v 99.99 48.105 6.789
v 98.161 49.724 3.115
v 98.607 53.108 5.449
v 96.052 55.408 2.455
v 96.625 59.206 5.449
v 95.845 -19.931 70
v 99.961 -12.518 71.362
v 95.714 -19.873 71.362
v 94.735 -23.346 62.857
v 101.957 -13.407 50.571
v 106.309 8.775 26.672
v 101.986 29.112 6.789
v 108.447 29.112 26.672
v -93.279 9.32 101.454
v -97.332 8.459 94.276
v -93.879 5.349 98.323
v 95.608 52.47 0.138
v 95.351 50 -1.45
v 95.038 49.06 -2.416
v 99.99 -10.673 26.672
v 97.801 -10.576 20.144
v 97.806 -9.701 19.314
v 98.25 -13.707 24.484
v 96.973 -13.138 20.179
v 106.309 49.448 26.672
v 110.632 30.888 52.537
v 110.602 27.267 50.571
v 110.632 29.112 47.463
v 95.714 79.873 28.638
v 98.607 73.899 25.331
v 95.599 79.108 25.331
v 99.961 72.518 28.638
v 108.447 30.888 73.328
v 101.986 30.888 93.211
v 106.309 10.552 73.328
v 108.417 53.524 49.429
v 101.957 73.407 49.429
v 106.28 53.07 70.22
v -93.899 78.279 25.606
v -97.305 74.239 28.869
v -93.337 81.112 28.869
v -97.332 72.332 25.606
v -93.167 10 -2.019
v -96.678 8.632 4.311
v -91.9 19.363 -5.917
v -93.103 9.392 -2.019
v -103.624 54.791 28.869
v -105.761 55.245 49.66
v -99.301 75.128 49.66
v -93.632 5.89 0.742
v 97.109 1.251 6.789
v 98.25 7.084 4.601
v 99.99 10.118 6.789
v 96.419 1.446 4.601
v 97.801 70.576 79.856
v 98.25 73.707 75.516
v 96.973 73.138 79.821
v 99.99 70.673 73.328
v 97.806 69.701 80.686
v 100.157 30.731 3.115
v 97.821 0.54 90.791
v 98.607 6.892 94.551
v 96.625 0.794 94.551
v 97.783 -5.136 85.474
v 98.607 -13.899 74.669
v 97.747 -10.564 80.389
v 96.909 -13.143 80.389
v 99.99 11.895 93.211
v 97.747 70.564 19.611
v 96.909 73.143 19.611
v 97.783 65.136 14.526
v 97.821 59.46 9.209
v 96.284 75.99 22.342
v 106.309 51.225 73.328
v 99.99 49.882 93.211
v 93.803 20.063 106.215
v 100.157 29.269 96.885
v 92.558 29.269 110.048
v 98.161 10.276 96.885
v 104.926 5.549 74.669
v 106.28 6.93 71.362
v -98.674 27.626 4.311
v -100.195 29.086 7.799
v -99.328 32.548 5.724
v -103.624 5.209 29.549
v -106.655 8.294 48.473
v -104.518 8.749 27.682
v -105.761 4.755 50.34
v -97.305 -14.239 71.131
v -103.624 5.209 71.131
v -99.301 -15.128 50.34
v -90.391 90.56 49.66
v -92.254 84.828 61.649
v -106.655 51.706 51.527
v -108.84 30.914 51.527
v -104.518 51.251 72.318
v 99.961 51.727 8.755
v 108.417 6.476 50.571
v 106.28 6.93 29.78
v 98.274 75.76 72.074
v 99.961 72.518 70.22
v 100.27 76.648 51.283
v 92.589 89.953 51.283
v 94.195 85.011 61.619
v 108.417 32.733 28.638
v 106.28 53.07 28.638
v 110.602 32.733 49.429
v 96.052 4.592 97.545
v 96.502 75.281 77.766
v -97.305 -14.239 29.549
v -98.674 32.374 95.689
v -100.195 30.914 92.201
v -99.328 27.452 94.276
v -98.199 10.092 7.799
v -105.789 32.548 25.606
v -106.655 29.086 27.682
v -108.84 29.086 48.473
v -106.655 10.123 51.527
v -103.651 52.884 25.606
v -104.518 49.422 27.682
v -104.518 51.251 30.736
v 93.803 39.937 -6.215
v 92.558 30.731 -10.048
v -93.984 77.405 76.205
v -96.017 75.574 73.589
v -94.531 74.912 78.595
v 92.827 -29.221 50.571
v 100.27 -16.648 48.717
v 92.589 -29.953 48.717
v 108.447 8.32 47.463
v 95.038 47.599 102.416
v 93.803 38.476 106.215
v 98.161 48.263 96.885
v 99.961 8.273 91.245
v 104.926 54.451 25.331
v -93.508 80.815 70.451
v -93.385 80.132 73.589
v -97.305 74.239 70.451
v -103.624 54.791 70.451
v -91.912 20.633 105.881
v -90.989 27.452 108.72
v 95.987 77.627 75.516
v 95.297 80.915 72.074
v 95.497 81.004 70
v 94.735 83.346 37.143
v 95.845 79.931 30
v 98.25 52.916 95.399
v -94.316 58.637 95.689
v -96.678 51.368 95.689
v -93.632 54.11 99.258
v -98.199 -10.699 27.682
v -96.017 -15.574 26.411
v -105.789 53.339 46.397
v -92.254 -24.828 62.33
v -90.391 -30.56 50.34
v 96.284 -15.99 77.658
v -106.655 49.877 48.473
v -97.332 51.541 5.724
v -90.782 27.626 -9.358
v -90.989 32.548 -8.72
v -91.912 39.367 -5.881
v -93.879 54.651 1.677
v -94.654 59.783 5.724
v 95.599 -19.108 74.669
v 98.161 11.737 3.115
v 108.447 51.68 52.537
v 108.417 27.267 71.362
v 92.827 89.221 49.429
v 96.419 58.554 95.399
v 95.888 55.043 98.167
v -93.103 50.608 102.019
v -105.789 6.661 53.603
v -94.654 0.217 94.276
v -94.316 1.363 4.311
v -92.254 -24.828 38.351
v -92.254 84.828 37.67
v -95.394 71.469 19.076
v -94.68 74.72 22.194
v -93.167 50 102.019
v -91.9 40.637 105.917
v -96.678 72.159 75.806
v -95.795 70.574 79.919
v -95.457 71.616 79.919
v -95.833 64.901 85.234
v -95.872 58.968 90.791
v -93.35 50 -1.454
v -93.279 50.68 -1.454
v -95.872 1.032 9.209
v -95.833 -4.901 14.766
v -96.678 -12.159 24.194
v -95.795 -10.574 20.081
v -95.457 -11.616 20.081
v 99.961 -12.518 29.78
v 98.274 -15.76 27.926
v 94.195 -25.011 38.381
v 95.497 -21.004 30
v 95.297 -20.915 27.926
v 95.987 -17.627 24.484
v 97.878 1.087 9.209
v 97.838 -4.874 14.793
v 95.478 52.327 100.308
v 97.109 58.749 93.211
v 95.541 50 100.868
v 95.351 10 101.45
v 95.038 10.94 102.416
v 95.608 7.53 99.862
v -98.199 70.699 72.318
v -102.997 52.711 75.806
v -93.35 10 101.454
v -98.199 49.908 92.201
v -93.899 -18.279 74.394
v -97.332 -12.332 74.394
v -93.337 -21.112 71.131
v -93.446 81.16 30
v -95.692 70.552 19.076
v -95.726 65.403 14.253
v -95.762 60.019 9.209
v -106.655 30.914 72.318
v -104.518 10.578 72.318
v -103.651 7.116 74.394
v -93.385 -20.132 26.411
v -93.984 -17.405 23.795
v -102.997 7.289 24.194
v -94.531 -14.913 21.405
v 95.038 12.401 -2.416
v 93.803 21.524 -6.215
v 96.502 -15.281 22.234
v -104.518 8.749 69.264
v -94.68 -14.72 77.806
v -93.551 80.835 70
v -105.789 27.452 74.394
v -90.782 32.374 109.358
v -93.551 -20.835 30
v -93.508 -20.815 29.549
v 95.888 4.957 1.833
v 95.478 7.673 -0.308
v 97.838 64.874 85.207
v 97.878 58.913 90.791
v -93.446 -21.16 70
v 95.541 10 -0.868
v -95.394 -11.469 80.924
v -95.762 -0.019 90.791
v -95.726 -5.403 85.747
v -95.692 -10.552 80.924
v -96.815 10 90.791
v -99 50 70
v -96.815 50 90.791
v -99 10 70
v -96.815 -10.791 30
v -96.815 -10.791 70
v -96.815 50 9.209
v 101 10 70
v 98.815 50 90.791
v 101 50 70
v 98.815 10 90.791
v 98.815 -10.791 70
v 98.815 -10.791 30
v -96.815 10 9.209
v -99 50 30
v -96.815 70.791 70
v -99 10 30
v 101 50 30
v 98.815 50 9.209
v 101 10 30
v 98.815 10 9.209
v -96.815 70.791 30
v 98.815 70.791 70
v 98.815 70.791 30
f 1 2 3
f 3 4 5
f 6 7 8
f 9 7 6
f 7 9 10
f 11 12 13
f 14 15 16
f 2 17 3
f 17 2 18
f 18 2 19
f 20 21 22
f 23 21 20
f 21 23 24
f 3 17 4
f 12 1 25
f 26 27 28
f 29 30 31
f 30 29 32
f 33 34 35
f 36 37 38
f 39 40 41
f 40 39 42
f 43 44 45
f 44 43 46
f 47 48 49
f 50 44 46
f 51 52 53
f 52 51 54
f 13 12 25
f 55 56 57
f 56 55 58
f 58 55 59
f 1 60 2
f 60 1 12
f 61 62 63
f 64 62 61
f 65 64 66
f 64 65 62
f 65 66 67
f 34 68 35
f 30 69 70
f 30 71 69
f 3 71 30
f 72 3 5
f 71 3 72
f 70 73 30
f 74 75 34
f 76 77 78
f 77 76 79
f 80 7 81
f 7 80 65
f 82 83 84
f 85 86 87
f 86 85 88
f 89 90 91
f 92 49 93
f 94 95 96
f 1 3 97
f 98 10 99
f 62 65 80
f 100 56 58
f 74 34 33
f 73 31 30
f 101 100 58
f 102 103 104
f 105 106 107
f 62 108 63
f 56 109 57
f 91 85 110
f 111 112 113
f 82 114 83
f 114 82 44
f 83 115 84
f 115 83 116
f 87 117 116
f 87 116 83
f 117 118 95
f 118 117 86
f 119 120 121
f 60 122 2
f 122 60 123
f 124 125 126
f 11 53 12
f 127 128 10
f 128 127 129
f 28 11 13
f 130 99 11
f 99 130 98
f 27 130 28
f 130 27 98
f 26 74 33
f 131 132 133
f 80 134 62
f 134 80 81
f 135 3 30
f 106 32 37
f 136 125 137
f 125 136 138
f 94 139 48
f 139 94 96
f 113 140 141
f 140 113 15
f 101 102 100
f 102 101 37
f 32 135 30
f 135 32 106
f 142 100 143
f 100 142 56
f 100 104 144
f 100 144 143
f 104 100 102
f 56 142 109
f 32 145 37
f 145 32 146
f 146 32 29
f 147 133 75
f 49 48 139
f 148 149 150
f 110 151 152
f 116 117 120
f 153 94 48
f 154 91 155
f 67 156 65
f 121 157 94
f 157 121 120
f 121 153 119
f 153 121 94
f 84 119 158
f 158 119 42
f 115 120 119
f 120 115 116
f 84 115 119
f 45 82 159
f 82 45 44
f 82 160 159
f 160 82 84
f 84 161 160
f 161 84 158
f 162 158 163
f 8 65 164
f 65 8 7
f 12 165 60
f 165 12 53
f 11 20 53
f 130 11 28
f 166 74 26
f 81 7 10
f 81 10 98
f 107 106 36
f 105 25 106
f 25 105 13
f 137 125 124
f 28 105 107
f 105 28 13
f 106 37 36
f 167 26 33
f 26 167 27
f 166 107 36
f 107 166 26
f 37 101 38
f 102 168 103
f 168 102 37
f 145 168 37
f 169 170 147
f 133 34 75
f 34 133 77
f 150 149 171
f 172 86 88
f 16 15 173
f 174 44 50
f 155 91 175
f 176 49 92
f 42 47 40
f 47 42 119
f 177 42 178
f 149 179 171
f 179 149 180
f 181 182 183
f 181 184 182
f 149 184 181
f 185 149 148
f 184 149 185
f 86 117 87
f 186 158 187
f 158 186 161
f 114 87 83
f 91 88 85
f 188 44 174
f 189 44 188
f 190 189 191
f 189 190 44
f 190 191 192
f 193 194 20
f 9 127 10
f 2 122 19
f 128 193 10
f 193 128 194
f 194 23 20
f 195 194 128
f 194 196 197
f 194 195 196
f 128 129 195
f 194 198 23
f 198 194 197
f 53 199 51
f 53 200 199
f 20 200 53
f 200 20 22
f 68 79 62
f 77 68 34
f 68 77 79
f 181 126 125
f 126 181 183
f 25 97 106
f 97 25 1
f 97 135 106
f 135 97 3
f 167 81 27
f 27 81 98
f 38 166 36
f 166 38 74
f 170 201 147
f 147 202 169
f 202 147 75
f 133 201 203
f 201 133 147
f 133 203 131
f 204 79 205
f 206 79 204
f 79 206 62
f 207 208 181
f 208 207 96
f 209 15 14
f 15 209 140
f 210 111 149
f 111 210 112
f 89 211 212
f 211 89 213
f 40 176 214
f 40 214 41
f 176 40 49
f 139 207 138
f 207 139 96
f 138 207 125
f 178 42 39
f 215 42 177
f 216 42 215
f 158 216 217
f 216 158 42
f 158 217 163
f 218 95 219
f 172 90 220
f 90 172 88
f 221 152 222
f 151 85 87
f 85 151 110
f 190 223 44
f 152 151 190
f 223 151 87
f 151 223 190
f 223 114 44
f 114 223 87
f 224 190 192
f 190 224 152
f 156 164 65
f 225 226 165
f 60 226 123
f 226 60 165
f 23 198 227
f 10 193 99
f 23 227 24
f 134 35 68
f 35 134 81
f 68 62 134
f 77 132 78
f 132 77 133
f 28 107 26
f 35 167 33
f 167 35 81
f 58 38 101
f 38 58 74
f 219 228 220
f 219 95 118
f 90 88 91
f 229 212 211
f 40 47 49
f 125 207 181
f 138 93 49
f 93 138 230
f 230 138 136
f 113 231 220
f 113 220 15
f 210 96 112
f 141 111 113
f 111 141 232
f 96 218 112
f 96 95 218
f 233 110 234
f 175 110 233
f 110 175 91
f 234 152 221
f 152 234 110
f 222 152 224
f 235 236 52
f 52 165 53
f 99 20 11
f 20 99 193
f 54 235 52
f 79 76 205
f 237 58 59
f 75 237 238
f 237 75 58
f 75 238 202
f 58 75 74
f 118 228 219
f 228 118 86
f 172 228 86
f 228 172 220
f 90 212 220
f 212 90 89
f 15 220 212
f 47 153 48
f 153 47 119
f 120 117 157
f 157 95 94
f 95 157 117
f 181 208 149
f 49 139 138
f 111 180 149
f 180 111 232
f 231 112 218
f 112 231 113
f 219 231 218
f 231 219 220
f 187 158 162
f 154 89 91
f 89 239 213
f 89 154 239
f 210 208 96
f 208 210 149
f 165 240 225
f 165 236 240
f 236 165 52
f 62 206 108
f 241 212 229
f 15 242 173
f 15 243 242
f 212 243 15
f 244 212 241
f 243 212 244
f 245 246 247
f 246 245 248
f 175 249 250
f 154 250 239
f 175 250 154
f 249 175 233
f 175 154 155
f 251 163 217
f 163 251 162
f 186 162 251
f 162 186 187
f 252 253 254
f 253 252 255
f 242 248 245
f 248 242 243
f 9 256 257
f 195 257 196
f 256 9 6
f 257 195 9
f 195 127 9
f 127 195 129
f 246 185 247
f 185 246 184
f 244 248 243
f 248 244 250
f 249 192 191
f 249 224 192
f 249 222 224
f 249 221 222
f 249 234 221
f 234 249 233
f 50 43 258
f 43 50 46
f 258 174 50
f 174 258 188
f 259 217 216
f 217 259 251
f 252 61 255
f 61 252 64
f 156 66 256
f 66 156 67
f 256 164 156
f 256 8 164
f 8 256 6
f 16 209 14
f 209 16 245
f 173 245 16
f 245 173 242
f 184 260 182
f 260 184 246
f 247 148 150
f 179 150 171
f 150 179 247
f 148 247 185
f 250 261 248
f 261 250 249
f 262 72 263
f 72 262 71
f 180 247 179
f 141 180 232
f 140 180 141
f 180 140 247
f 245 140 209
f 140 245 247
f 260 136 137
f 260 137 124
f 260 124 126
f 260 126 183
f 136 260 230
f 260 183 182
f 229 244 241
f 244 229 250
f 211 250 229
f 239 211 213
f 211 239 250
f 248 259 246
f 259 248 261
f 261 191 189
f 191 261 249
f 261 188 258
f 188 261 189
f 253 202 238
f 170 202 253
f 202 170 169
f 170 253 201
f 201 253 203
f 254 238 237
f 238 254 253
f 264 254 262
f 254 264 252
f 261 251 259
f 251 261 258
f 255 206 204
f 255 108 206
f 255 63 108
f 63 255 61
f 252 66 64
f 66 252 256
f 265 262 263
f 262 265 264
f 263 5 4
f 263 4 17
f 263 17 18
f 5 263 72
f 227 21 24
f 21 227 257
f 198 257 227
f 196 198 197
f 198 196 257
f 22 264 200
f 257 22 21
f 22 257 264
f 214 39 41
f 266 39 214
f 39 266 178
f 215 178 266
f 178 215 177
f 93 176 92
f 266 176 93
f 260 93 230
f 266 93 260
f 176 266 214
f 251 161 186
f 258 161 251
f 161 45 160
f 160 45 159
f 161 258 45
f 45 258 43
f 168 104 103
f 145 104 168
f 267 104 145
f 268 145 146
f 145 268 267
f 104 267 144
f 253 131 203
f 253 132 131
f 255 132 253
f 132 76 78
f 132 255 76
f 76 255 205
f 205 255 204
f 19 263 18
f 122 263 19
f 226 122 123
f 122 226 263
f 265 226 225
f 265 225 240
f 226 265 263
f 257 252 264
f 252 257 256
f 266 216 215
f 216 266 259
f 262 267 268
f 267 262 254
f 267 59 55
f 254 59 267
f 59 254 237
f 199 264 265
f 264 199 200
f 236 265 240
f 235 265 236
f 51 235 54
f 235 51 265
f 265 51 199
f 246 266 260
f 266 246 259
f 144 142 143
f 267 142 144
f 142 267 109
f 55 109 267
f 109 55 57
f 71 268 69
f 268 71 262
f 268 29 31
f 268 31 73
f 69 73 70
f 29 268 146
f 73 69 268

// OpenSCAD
r=10;
epsilon = 1e-6;
difference(){
clad(r) translate([01,30,50])sphere(100);
#cladx(r*4 )translate([01,30,50]) sphere(100);
}



module clad(r) {
        minkowski() {
            children();
            //        icosphere(r,2);
             isosphere(r,70); 
        }
    }
    
    module cladx(r) {
        minkowski() {
            children();
               cube([epsilon,r,r],center=true); 
        }
    }
    // unionRound helper
    module shell(r) {
        difference() {
            clad(r) children();
            children();
        }
    }
    
    /*    
    // The following is a sphere with some equidistant properties.
    // Not strictly necessary

    Kogan, Jonathan (2017) "A New Computationally Efficient Method for Spacing n Points on a Sphere," Rose-Hulman Undergraduate Mathematics Journal: Vol. 18 : Iss. 2 , Article 5.
    Available at: https://scholar.rose-hulman.edu/rhumj/vol18/iss2/5 */
    
    function sphericalcoordinate(x,y)=  [cos(x  )*cos(y  ), sin(x  )*cos(y  ), sin(y  )];
    function NX(n,x)= 
    let(toDeg=57.2958,PI=acos(-1)/toDeg,
    start=(-1.+1./(n-1.)),increment=(2.-2./(n-1.))/(n-1.) )
    [ for (j= [0:n-1])let (s=start+j*increment )
    sphericalcoordinate(   s*x*toDeg,  PI/2.* sign(s)*(1.-sqrt(1.-abs(s)))*toDeg)];
    function generatepoints(n)= NX(n,0.1+1.2*n);
    module isosphere(r,detail){
    a= generatepoints(detail);
    scale(r)hull()polyhedron(a,[[for(i=[0:len(a)-1])i]]);
    }
